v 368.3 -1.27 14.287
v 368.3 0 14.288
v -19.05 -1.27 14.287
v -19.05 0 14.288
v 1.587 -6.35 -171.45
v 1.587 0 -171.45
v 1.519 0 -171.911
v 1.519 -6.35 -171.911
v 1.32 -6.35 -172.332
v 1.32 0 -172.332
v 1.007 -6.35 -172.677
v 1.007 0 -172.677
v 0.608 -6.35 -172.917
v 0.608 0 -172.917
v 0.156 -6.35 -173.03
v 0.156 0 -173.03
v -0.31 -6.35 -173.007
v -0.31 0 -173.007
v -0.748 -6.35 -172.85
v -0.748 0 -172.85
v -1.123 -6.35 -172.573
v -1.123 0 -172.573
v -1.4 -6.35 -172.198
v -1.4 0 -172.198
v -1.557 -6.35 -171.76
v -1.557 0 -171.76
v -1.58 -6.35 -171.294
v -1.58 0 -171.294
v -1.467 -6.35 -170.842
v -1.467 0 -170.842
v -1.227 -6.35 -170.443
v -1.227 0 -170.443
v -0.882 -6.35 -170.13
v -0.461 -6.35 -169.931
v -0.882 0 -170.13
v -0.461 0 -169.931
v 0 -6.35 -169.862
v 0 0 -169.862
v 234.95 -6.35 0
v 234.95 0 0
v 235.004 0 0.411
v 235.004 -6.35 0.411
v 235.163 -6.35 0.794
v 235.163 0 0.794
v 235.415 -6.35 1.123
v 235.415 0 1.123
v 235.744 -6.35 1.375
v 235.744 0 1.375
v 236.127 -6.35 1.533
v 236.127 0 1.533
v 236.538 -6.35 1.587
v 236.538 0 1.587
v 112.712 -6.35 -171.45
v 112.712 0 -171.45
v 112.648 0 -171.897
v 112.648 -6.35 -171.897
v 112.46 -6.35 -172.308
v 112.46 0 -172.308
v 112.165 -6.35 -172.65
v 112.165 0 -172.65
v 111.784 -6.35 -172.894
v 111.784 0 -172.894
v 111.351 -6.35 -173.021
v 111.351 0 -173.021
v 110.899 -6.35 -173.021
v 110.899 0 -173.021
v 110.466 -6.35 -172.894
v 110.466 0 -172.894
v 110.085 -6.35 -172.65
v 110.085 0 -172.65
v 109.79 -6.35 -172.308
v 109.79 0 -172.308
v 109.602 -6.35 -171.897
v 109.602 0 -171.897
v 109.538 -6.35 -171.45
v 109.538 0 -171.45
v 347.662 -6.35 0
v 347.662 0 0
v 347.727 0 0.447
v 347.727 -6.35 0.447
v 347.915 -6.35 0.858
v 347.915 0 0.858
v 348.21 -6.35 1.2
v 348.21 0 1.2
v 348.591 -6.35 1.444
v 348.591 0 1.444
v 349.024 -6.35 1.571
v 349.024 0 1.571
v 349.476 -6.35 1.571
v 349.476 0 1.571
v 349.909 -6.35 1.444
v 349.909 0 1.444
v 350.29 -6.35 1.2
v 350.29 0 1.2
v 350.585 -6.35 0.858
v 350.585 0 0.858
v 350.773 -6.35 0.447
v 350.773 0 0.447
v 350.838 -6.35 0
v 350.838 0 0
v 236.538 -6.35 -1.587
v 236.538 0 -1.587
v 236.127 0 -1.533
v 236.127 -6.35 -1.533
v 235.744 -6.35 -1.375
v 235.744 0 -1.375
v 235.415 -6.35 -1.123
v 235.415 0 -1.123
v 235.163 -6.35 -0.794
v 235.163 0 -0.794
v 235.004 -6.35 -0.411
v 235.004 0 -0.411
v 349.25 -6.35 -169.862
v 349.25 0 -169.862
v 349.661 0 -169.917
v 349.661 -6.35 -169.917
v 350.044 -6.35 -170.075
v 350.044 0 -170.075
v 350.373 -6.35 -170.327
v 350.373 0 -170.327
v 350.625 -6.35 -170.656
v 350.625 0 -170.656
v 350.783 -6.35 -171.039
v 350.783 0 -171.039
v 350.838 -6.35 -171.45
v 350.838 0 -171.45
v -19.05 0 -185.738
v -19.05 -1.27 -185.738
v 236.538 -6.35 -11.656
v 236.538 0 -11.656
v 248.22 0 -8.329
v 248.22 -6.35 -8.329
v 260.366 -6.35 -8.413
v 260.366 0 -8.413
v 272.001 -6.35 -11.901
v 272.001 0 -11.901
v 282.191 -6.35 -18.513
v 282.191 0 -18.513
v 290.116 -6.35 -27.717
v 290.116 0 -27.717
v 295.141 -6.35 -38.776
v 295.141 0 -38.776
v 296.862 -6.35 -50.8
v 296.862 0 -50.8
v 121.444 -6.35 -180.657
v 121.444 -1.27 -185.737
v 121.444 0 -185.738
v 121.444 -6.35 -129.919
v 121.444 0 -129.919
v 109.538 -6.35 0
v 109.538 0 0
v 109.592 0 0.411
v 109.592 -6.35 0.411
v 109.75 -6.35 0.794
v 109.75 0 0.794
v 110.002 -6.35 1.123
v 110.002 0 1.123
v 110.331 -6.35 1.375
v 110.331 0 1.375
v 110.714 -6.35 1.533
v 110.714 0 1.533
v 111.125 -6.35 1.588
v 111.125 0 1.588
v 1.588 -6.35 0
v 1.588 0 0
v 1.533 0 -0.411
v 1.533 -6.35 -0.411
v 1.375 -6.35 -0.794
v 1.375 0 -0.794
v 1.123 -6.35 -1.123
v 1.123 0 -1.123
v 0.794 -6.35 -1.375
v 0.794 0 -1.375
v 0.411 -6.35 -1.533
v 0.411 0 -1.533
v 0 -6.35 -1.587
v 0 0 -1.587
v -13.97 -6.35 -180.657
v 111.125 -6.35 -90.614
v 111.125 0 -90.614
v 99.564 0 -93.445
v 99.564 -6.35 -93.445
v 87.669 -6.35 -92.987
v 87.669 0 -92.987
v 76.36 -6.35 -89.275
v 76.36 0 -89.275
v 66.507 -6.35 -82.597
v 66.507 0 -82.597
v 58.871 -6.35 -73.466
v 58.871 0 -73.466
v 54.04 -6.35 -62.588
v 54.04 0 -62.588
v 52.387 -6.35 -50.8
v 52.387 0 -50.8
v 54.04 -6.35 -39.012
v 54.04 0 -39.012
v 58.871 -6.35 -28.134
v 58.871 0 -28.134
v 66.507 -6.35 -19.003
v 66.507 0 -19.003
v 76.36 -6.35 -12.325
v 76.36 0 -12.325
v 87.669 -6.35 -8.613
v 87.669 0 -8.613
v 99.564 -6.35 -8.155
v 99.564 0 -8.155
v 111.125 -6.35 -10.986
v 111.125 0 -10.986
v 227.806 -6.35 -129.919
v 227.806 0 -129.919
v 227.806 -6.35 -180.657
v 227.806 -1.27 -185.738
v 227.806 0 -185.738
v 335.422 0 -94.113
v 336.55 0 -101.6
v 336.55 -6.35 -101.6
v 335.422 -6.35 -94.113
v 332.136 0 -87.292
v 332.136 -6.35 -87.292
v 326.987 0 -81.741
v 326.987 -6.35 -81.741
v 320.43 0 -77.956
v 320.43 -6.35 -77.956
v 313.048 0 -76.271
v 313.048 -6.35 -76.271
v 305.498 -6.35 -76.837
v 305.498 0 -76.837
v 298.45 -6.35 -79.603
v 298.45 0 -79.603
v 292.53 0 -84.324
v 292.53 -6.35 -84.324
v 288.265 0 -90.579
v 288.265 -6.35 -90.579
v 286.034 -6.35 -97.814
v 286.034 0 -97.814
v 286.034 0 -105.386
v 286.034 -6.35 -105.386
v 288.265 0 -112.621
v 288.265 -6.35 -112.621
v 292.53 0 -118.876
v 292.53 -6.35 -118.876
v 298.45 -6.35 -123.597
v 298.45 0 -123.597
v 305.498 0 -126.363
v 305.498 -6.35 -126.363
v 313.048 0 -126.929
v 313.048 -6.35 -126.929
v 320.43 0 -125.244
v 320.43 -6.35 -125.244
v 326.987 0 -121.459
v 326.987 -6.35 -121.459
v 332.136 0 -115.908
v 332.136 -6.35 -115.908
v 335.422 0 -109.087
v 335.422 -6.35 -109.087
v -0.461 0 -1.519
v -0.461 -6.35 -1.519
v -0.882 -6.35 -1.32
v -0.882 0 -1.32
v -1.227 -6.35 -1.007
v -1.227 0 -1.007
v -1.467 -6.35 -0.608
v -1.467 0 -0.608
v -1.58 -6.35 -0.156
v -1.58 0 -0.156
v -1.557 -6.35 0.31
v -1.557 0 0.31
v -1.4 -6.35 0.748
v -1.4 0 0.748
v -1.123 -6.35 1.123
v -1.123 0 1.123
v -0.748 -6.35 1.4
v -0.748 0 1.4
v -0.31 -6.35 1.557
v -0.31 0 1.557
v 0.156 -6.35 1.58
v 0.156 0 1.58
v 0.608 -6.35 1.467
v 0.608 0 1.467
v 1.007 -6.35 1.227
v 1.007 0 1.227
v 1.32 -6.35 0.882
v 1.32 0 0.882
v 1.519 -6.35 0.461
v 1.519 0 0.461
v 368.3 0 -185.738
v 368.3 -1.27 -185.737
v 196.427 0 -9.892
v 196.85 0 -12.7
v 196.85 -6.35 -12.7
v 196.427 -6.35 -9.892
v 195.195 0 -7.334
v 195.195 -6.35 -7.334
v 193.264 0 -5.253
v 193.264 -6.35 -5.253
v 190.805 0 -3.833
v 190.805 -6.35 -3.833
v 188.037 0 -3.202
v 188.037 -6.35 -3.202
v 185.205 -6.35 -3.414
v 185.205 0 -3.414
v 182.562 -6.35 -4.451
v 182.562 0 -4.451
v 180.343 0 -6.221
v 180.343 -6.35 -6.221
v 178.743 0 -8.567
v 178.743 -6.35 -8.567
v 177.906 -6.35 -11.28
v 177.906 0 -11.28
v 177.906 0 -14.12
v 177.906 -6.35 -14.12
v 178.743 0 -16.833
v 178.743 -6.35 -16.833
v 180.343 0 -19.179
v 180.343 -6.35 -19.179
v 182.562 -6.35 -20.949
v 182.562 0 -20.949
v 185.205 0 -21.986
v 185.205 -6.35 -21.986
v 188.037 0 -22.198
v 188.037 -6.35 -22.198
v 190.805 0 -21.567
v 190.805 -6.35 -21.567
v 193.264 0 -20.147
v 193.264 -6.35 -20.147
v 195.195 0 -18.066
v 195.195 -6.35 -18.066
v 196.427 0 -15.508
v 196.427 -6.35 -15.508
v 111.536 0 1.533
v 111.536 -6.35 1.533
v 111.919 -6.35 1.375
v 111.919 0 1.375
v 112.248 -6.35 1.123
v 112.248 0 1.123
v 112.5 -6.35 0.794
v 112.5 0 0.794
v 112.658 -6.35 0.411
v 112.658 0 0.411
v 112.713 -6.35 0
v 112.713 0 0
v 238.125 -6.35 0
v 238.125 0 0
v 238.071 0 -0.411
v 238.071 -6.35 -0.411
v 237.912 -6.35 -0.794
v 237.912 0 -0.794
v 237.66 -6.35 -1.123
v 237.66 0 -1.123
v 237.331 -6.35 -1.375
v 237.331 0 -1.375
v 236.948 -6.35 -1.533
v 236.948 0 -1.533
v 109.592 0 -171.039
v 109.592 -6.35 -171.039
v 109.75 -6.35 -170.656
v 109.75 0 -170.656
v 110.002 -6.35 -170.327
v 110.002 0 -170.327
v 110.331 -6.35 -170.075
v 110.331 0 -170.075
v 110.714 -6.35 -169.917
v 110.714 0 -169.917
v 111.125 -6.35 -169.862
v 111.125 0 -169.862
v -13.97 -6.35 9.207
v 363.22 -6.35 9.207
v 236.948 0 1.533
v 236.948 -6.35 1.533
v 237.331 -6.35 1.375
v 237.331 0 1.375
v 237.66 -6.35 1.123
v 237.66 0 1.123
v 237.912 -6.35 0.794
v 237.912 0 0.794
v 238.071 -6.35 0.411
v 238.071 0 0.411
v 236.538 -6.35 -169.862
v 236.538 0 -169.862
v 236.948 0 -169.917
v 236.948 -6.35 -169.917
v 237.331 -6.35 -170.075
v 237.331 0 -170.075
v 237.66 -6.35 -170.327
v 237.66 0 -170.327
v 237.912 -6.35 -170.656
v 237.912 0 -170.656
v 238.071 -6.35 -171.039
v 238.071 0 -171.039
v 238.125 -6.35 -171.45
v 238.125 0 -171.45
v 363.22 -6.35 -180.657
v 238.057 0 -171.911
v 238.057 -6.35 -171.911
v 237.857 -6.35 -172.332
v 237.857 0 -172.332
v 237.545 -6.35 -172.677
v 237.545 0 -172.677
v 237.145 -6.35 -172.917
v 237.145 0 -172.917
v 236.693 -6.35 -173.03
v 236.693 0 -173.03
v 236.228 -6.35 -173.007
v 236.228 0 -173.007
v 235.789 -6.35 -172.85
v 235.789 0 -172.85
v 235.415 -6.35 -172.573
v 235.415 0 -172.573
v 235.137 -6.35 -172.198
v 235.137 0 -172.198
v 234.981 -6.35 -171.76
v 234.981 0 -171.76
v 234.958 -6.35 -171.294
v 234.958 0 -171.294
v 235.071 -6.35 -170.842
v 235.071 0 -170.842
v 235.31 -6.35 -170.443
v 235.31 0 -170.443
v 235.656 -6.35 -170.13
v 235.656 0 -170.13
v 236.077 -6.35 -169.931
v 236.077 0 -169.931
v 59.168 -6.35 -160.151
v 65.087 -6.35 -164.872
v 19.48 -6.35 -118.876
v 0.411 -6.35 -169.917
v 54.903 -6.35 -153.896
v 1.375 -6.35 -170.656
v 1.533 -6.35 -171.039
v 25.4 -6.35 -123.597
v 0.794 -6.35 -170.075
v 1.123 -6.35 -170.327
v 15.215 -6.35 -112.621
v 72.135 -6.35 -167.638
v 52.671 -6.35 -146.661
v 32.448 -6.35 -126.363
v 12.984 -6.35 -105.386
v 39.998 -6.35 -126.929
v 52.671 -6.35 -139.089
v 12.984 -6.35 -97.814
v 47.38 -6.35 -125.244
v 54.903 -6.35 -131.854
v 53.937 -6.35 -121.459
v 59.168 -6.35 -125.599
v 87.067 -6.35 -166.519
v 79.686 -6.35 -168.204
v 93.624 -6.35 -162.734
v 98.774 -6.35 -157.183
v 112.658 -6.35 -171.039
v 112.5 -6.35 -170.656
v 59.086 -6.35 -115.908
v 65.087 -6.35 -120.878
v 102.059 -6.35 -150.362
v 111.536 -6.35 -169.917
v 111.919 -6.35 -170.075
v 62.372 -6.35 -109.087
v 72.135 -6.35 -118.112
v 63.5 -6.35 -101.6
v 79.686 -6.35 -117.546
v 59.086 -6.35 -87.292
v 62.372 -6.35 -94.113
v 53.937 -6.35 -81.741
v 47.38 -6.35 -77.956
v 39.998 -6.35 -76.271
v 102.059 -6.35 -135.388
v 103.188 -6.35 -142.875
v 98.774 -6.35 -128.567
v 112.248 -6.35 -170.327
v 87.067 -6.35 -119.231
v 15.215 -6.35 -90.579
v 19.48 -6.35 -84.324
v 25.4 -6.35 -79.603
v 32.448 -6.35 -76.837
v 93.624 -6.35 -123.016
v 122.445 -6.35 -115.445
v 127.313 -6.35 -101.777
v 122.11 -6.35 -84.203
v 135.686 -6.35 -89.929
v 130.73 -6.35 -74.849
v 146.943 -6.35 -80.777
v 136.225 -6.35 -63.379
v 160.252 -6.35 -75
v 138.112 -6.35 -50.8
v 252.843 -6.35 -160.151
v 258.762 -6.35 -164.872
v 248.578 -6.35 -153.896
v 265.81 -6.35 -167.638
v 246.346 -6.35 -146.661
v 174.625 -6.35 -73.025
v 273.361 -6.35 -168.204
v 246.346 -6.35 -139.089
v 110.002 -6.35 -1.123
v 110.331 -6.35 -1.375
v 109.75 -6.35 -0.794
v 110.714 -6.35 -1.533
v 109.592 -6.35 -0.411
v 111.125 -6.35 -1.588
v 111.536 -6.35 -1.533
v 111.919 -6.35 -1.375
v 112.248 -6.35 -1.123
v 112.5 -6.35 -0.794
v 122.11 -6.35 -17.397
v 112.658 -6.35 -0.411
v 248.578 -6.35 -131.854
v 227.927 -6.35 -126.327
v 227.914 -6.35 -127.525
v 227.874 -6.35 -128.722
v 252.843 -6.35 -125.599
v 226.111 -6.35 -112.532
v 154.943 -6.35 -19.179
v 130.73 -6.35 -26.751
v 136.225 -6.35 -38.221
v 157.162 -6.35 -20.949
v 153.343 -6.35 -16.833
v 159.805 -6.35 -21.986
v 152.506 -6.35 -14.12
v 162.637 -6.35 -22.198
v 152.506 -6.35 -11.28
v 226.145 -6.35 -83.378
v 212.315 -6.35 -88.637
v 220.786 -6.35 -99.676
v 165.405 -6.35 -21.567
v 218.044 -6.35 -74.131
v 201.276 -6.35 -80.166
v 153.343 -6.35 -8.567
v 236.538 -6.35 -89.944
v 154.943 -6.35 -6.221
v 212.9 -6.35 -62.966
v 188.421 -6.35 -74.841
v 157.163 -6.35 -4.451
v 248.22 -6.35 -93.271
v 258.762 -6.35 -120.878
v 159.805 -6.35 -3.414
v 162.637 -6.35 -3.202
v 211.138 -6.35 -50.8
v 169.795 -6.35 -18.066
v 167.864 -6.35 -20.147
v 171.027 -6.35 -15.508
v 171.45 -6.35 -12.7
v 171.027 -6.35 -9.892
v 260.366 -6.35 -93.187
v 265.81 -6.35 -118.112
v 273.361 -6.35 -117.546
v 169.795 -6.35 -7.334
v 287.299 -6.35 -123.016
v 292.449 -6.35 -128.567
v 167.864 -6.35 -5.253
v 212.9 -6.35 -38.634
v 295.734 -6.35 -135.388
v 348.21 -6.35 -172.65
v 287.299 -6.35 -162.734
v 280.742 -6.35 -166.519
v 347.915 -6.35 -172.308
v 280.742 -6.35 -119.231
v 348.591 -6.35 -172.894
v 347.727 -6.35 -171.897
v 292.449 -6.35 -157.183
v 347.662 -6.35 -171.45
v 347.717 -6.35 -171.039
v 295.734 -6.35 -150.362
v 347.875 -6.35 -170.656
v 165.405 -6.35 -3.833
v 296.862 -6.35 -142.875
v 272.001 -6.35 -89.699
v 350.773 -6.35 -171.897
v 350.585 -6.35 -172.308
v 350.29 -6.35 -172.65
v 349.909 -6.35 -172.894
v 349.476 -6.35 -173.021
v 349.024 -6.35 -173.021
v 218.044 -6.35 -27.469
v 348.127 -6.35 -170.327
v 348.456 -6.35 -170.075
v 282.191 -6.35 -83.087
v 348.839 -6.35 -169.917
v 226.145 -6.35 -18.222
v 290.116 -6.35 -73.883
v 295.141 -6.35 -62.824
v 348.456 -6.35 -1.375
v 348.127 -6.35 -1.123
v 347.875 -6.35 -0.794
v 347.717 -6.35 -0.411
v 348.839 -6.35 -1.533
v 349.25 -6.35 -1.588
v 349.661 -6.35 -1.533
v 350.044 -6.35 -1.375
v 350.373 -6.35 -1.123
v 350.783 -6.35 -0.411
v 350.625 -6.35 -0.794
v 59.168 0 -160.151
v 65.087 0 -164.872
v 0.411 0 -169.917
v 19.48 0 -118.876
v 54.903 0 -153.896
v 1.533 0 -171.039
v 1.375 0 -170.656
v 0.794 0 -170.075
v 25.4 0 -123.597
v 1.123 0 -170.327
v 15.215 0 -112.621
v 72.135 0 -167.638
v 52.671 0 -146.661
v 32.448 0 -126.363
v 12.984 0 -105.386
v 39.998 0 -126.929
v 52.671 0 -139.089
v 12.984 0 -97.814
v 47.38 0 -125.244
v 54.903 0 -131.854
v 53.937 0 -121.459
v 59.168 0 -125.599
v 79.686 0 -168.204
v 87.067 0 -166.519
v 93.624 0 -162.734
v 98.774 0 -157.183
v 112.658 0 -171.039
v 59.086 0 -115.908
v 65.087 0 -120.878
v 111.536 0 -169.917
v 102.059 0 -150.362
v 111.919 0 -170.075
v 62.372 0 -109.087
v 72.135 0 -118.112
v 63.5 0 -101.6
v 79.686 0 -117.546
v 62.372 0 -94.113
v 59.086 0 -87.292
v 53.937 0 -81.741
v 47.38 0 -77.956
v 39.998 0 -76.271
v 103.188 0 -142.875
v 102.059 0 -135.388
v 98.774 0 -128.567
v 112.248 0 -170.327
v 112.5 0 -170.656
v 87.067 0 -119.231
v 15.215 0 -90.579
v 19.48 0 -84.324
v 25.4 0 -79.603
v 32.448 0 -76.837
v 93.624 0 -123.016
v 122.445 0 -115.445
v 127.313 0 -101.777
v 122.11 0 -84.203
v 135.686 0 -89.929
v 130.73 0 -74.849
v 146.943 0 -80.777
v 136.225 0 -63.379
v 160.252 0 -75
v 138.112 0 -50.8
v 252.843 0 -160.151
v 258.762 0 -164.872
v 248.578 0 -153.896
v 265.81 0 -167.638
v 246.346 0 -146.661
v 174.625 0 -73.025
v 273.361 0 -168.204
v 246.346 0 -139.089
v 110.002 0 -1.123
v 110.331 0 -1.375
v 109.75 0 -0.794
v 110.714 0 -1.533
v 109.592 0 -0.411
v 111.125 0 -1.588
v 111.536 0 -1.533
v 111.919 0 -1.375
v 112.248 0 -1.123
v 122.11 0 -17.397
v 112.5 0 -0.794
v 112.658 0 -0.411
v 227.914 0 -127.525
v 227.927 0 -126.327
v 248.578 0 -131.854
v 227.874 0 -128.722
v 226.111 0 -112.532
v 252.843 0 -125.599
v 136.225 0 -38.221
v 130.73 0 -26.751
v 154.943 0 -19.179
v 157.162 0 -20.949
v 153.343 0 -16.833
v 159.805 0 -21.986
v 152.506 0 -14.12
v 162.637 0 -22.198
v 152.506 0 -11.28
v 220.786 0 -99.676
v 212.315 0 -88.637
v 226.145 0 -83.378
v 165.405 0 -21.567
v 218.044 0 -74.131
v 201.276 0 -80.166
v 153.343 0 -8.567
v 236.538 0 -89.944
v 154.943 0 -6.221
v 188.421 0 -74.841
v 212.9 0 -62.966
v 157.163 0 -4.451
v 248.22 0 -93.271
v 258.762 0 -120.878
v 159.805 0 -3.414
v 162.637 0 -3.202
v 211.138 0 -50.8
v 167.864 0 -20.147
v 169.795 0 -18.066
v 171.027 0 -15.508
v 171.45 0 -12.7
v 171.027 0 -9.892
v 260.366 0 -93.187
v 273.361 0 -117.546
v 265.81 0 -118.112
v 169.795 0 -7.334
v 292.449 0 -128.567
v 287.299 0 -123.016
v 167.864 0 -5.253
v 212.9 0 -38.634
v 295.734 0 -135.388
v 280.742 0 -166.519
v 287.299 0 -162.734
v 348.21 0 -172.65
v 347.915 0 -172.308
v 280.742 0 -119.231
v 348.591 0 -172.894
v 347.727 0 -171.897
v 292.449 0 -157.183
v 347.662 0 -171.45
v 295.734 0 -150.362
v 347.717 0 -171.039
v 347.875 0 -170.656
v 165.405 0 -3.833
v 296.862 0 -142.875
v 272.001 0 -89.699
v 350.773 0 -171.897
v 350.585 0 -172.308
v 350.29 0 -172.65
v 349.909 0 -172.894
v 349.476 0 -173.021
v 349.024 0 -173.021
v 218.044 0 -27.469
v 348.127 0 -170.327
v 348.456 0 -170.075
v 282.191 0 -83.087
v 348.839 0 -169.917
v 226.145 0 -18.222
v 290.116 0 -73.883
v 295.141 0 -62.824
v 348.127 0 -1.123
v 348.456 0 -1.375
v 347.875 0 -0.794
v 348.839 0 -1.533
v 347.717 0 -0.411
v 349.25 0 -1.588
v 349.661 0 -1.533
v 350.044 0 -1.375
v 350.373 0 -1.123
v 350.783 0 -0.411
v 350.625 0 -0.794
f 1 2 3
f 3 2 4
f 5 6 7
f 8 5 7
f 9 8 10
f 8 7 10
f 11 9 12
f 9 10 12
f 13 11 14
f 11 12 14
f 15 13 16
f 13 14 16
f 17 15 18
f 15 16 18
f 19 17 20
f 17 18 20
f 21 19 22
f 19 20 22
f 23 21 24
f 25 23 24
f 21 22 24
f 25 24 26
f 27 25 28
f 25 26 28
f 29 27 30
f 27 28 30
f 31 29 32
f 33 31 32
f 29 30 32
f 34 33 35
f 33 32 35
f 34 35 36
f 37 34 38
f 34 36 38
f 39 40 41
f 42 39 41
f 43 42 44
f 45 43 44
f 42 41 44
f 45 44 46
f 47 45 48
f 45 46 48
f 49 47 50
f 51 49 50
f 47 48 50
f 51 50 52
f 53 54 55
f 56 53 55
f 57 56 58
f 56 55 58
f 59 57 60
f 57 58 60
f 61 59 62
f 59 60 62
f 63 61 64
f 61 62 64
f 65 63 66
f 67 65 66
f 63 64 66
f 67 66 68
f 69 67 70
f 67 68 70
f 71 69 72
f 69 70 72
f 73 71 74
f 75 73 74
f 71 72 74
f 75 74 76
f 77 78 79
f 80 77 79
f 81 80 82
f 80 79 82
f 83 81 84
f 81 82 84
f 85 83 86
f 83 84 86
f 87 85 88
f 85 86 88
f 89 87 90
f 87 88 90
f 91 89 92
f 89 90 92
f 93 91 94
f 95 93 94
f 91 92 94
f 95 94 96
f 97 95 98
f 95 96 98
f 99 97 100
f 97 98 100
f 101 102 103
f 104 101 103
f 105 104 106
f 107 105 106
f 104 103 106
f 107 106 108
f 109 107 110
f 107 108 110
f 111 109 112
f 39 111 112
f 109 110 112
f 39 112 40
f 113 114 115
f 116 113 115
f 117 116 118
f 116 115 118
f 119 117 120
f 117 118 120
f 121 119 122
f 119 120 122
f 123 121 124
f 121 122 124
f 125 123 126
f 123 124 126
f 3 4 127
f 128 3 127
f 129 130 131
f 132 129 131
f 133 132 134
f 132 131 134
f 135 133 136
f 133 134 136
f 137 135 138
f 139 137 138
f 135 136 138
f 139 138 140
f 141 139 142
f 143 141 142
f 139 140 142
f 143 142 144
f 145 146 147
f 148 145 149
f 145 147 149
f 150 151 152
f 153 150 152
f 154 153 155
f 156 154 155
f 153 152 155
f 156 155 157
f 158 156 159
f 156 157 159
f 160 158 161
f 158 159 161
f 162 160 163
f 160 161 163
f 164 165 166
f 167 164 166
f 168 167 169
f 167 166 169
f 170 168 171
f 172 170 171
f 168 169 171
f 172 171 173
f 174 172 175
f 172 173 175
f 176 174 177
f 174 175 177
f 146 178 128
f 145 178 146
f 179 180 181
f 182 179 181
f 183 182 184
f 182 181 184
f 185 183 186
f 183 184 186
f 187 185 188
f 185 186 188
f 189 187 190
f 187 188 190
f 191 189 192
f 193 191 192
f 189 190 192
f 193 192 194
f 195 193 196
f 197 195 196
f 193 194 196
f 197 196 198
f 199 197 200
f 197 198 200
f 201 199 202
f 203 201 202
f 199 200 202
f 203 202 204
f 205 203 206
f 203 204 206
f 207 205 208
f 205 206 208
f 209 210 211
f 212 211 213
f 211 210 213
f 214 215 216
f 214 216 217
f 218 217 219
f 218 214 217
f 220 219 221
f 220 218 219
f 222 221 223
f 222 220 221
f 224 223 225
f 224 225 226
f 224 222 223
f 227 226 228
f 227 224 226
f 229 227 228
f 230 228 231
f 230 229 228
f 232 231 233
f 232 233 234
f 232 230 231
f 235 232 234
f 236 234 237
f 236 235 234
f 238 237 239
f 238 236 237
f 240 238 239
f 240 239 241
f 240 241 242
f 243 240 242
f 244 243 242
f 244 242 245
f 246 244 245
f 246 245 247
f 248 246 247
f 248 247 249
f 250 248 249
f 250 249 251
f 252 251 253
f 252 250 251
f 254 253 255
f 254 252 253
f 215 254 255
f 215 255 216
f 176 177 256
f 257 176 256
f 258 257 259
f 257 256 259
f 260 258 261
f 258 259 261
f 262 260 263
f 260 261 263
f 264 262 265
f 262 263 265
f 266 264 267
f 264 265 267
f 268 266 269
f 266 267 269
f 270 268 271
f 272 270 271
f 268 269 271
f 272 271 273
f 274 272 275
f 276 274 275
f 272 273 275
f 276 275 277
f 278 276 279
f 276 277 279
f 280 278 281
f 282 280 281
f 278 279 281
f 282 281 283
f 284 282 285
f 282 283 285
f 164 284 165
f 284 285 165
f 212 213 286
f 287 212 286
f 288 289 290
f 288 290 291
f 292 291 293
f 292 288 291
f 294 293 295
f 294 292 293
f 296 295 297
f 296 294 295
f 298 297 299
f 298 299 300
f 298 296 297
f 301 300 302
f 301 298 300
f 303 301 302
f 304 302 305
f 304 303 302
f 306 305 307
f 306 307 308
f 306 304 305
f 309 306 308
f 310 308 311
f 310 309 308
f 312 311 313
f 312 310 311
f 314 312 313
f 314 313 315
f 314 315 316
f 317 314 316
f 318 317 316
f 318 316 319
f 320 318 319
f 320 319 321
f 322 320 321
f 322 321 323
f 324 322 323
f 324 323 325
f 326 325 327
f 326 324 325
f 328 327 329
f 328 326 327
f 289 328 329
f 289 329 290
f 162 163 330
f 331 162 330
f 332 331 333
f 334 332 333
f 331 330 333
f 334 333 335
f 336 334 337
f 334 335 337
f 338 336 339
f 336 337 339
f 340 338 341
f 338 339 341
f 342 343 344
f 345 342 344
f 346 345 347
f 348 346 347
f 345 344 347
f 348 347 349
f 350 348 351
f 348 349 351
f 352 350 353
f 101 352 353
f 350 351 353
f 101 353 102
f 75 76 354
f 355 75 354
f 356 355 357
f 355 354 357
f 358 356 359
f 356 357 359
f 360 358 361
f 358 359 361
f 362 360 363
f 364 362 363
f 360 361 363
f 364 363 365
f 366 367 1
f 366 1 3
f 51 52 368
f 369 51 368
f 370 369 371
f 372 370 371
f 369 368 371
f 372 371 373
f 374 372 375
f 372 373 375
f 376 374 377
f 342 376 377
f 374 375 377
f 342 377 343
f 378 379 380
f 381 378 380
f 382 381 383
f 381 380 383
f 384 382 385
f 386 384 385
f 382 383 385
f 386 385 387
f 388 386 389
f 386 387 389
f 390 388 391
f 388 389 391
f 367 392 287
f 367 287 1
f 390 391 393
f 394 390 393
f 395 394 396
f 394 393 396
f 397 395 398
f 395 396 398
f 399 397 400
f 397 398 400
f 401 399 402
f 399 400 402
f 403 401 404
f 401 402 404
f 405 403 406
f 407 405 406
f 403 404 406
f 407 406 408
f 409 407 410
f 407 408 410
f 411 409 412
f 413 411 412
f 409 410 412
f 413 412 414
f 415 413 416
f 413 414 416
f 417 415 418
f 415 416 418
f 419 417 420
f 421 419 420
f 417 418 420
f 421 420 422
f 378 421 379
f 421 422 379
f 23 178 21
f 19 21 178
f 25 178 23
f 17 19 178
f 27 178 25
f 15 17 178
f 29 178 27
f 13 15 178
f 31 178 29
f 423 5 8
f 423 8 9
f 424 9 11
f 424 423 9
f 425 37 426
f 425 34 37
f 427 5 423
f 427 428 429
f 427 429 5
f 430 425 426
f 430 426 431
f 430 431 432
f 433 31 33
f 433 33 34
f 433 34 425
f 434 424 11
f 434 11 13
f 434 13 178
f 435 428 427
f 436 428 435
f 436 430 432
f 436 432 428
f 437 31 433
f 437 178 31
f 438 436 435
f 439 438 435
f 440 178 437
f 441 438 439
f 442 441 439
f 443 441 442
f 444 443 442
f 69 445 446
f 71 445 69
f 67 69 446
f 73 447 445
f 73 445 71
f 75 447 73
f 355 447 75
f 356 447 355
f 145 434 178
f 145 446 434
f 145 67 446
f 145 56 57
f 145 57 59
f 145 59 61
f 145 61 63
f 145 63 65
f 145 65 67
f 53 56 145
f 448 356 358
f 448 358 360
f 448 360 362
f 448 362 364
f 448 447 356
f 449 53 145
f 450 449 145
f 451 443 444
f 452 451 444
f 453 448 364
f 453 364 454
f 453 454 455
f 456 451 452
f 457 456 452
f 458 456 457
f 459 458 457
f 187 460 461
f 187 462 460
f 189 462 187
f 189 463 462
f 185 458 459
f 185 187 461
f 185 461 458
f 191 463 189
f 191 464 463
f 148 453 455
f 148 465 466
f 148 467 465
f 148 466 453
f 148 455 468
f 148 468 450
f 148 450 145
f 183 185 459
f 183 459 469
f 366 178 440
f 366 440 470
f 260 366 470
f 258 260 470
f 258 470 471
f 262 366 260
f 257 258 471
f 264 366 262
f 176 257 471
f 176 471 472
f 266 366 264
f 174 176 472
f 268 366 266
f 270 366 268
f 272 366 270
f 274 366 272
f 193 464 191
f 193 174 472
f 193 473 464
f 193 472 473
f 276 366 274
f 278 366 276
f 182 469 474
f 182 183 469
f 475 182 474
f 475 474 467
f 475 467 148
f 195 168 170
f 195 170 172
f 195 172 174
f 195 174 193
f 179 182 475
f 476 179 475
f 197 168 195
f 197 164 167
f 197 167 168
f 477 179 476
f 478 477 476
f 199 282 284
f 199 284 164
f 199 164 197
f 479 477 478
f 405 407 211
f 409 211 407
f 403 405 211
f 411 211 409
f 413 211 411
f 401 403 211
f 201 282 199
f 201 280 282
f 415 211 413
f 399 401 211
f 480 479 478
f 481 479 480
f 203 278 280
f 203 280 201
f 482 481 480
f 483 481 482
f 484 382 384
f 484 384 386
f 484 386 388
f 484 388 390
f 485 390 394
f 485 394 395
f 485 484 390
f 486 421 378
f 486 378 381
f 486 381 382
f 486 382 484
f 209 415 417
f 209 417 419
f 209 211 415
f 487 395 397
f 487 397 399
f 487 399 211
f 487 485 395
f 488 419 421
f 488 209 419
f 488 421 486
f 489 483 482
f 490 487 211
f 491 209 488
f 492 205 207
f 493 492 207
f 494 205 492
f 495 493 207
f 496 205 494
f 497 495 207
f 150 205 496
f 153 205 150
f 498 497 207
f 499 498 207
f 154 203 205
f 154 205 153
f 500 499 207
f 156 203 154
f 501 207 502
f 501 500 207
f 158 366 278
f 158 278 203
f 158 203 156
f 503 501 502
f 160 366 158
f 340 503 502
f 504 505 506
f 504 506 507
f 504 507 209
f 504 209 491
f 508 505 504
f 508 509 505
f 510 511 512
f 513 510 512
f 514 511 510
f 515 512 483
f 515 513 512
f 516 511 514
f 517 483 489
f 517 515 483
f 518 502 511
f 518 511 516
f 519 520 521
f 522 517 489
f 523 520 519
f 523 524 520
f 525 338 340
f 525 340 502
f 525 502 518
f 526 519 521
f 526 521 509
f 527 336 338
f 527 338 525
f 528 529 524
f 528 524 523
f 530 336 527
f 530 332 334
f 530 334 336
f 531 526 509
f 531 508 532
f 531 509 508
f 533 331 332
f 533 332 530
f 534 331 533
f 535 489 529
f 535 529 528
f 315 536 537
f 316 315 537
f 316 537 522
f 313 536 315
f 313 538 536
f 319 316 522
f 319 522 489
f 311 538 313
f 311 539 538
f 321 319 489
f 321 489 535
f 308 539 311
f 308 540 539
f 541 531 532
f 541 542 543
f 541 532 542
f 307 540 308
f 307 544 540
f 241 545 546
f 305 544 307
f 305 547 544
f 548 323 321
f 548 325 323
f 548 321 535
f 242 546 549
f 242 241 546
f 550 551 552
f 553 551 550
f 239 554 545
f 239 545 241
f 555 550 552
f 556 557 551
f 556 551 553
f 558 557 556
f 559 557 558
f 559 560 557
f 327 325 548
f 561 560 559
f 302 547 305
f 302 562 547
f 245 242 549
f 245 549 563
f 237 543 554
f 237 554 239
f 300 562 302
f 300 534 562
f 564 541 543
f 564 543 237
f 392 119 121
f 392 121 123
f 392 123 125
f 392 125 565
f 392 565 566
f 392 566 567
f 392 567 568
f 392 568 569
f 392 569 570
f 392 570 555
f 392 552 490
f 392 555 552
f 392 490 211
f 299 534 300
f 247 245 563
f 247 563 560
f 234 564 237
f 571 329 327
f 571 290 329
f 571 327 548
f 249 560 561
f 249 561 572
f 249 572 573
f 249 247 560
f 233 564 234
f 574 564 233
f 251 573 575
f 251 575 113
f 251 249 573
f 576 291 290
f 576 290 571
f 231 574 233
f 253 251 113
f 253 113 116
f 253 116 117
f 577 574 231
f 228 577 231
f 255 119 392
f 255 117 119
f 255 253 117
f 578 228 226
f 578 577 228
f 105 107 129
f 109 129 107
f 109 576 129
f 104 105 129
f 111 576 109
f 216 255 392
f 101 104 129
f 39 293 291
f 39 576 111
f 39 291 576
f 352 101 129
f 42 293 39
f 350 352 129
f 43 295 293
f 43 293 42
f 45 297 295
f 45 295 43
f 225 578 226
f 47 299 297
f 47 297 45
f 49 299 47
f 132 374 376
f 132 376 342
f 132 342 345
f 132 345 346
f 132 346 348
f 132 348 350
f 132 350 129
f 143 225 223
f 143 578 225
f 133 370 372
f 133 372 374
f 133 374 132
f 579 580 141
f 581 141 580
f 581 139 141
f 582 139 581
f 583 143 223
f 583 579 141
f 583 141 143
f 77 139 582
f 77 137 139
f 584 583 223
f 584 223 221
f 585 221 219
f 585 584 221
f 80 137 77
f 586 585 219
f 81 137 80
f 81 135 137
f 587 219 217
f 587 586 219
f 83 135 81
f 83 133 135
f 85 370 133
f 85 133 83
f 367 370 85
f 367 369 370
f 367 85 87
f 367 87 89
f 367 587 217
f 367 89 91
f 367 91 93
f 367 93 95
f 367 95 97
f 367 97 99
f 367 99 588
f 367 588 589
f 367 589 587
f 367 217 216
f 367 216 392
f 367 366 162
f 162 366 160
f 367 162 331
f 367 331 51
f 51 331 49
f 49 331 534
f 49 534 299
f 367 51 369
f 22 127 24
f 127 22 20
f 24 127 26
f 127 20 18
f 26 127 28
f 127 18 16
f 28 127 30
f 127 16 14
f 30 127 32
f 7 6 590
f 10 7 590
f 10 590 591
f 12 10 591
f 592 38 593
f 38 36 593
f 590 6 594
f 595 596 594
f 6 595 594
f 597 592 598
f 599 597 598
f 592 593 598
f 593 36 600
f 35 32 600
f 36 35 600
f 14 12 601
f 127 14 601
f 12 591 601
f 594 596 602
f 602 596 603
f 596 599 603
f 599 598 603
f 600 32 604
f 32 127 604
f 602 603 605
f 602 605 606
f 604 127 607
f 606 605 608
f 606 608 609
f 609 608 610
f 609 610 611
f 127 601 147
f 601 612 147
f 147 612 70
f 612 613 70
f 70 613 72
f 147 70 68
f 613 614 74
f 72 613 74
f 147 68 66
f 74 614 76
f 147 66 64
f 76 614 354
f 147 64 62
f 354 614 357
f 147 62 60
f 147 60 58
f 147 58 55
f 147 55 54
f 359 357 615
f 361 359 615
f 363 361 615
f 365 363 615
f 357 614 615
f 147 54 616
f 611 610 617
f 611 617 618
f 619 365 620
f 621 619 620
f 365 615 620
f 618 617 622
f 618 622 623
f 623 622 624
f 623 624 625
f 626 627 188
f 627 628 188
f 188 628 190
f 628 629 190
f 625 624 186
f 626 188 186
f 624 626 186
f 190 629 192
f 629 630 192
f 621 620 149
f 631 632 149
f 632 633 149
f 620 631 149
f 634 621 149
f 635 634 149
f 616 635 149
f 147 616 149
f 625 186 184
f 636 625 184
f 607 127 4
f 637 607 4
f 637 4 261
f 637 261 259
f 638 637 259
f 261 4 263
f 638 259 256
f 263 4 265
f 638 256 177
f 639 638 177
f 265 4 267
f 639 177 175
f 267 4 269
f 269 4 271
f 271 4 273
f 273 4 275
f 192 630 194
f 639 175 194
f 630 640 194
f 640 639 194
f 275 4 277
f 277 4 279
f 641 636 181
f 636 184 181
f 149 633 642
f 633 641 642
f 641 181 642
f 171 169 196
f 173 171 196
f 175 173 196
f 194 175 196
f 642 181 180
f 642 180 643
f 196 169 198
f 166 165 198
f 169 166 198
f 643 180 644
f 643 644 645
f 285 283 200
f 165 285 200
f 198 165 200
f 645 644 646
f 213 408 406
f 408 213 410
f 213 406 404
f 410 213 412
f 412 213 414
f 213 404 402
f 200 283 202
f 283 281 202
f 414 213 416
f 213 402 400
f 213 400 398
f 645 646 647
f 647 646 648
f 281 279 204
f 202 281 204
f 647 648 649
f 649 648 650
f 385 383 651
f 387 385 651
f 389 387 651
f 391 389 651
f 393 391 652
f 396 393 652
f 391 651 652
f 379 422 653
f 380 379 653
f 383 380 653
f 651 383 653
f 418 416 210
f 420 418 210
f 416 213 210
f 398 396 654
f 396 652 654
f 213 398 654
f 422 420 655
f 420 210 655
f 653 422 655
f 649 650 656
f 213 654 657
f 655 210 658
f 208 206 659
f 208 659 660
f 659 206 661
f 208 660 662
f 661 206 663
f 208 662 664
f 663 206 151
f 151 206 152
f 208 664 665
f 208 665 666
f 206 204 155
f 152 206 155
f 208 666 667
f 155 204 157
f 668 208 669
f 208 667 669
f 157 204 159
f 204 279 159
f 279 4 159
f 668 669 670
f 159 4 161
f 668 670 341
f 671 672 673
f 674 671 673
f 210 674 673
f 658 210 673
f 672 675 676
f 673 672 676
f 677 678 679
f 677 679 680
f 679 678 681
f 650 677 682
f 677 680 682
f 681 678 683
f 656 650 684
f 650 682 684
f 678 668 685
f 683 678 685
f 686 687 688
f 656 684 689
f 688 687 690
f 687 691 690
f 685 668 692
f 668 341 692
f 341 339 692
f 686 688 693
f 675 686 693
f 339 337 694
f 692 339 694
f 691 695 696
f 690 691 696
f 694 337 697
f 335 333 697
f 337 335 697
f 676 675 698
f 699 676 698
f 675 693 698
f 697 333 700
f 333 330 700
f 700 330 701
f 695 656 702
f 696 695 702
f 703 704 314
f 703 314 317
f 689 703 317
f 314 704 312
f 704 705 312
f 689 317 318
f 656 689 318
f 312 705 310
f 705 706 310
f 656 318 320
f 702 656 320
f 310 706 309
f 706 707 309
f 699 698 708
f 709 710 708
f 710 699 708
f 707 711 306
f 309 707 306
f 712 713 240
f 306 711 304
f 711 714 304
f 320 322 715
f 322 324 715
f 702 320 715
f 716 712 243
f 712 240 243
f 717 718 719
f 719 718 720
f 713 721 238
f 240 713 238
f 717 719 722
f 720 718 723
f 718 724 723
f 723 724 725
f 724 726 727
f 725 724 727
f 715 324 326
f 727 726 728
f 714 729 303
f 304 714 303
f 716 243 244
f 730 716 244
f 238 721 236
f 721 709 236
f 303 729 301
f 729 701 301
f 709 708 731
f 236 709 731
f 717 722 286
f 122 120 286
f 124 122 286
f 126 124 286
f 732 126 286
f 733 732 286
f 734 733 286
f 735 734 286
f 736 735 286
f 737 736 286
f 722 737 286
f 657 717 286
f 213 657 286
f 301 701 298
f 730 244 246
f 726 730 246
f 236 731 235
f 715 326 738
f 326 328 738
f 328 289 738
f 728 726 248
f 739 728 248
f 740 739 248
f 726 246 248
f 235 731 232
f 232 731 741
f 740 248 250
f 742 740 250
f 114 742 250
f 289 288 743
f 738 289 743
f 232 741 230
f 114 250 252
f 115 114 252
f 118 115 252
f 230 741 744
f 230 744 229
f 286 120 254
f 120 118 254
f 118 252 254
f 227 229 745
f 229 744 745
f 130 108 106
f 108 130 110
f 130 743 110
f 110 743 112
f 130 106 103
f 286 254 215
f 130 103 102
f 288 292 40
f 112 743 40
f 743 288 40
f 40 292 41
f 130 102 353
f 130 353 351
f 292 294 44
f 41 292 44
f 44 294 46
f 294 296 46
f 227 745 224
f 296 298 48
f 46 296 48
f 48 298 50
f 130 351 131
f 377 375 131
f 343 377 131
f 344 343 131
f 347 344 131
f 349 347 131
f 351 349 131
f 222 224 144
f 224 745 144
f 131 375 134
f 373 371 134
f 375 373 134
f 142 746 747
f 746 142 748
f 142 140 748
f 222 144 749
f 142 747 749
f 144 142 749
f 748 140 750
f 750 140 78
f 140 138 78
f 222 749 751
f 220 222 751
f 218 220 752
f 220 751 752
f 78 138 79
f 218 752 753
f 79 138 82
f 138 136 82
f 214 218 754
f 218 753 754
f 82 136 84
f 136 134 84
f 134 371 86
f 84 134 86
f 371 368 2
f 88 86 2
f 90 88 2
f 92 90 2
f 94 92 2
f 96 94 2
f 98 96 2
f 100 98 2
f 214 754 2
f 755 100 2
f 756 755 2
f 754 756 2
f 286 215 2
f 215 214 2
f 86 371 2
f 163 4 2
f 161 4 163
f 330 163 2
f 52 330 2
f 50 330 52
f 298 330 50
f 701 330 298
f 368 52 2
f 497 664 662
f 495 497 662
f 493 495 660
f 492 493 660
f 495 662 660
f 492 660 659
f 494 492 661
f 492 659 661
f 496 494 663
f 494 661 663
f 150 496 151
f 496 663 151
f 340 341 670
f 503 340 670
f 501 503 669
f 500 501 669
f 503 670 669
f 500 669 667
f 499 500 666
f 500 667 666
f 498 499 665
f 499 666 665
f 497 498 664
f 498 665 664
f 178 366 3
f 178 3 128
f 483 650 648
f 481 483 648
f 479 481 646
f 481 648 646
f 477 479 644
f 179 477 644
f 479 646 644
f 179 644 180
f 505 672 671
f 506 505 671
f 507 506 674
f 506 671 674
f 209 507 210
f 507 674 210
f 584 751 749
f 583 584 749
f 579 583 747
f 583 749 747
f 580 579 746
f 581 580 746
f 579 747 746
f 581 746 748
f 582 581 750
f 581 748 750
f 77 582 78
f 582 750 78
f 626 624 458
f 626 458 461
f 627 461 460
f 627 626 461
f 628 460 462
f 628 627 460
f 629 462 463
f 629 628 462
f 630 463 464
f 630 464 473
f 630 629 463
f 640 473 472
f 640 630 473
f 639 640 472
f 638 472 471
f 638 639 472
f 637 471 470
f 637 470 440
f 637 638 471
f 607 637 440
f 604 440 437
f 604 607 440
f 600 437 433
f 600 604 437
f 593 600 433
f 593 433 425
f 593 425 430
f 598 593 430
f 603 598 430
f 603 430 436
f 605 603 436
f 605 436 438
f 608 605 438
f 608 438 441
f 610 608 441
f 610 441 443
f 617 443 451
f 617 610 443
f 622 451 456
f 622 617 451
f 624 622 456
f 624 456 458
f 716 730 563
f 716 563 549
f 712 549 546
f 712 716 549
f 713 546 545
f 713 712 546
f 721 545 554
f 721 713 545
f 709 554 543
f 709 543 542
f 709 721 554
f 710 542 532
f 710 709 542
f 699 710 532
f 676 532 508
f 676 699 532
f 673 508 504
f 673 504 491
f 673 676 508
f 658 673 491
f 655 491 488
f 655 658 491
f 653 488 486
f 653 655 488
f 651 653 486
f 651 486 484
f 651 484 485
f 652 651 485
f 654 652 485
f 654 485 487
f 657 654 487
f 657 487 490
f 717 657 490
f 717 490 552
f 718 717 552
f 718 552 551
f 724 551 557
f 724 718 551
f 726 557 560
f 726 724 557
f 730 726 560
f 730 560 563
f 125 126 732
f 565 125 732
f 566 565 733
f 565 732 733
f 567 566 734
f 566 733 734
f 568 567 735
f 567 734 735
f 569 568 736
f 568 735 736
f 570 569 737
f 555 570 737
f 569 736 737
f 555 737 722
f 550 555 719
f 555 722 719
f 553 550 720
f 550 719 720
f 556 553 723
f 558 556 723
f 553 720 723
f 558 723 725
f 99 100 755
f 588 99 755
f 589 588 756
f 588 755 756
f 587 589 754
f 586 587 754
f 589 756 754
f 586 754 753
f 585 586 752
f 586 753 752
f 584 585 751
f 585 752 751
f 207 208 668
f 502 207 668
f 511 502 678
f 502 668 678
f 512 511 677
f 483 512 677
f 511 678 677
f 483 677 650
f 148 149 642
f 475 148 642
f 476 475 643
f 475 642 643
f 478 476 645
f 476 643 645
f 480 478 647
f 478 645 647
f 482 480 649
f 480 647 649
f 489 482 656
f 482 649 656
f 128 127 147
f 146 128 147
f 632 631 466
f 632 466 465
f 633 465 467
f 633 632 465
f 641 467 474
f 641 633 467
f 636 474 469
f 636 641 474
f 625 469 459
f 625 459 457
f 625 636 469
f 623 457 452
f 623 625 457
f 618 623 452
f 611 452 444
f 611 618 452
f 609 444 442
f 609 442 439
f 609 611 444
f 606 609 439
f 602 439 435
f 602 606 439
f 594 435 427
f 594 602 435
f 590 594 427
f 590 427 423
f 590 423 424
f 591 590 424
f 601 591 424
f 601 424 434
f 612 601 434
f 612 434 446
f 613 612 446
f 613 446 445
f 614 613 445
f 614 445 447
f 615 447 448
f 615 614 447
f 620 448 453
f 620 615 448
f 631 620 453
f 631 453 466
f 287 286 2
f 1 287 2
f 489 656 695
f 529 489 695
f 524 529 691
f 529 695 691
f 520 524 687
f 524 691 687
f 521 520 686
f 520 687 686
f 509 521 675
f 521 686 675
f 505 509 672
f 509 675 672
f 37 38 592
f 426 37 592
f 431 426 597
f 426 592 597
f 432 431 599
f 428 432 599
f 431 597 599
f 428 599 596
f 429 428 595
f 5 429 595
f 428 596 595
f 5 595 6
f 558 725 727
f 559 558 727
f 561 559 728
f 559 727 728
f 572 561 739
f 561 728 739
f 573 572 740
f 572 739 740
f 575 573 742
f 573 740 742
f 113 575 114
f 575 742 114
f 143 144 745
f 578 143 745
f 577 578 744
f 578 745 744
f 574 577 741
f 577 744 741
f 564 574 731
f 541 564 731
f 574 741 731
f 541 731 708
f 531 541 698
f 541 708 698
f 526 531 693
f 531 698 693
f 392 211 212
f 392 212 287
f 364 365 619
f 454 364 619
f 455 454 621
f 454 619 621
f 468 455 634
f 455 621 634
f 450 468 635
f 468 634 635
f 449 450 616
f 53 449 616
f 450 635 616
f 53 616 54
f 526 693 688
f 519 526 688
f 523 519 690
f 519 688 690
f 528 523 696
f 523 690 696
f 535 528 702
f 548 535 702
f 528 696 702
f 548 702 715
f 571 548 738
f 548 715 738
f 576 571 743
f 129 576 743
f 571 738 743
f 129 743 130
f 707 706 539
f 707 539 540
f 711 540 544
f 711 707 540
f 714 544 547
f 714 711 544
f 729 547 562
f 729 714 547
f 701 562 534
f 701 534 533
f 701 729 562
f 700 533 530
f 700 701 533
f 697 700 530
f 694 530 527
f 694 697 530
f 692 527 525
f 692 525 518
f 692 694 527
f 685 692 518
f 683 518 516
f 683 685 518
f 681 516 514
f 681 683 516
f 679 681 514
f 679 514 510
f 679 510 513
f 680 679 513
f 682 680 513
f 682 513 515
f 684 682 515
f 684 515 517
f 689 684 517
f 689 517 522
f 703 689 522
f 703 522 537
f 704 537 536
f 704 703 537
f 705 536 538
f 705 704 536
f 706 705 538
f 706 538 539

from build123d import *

# Parameters (mm, degrees)
F0_R     = 25.4
F0_R_2   = 9.525
F1_DEPTH = 6.35
F2_SIZE  = 5.08


with BuildPart() as f1:
    # F0 (on Front) → F1 (new body)
    with BuildSketch(Plane.XZ):
        with BuildLine():
            Line((109.5375, 0), (1.5875, 0))
            ThreePointArc((1.5875, 0), (1.122532, -1.122532), (0, -1.5875))
            Line((0, -1.5875), (0, -169.8625))
            ThreePointArc((0, -169.8625), (1.122532, -170.327468), (1.5875, -171.45))
            Line((1.5875, -171.45), (109.5375, -171.45))
            ThreePointArc((109.5375, -171.45), (110.002468, -170.327468), (111.125, -169.8625))
            Line((111.125, -169.8625), (111.125, -90.614297))
            ThreePointArc((111.125, -90.614297), (52.3875, -50.8), (111.125, -10.985703))
            Line((111.125, -10.985703), (111.125, -1.5875))
            ThreePointArc((111.125, -1.5875), (110.002468, -1.122532), (109.5375, 0))
        make_face()
        with Locations((77.7875, -142.875)):
            Circle(F0_R, mode=Mode.SUBTRACT)
        with Locations((38.1, -101.6)):
            Circle(F0_R, mode=Mode.SUBTRACT)
        with BuildLine():
            ThreePointArc((0, -1.5875), (-1.122532, 1.122532), (1.5875, 0))
            Line((1.5875, 0), (109.5375, 0))
            ThreePointArc((109.5375, 0), (110.002468, 1.122532), (111.125, 1.5875))
            Line((111.125, 1.5875), (111.125, 14.2875))
            Line((111.125, 14.2875), (-19.05, 14.2875))
            Line((-19.05, 14.2875), (-19.05, -185.7375))
            Line((-19.05, -185.7375), (121.44375, -185.7375))
            Line((121.44375, -185.7375), (121.44375, -129.918501))
            ThreePointArc((121.44375, -129.918501), (135.685573, -89.928697), (174.625, -73.025))
            Line((174.625, -73.025), (174.625, 0))
            Line((174.625, 0), (112.7125, 0))
            ThreePointArc((112.7125, 0), (112.247532, -1.122532), (111.125, -1.5875))
            Line((111.125, -1.5875), (111.125, -10.985703))
            ThreePointArc((111.125, -10.985703), (130.729826, -26.750554), (138.1125, -50.8))
            ThreePointArc((138.1125, -50.8), (130.729826, -74.849446), (111.125, -90.614297))
            Line((111.125, -90.614297), (111.125, -169.8625))
            ThreePointArc((111.125, -169.8625), (112.247532, -170.327468), (112.7125, -171.45))
            ThreePointArc((112.7125, -171.45), (111.125, -173.0375), (109.5375, -171.45))
            Line((109.5375, -171.45), (1.5875, -171.45))
            ThreePointArc((1.5875, -171.45), (-1.122532, -172.572532), (0, -169.8625))
            Line((0, -169.8625), (0, -1.5875))
        make_face()
        with Locations((161.925, -12.7)):
            Circle(F0_R_2, mode=Mode.SUBTRACT)
        with BuildLine():
            Line((234.95, 0), (174.625, 0))
            Line((174.625, 0), (174.625, -73.025))
            ThreePointArc((174.625, -73.025), (212.315461, -88.6369), (227.927361, -126.327361))
            ThreePointArc((227.927361, -126.327361), (227.897074, -128.123951), (227.80625, -129.918501))
            Line((227.80625, -129.918501), (227.80625, -185.7375))
            Line((227.80625, -185.7375), (368.3, -185.7375))
            Line((368.3, -185.7375), (368.3, 14.2875))
            Line((368.3, 14.2875), (236.5375, 14.2875))
            Line((236.5375, 14.2875), (236.5375, 1.5875))
            ThreePointArc((236.5375, 1.5875), (237.660032, 1.122532), (238.125, 0))
            Line((238.125, 0), (347.6625, 0))
            ThreePointArc((347.6625, 0), (349.25, 1.5875), (350.8375, 0))
            ThreePointArc((350.8375, 0), (350.372532, -1.122532), (349.25, -1.5875))
            Line((349.25, -1.5875), (349.25, -169.8625))
            ThreePointArc((349.25, -169.8625), (350.372532, -170.327468), (350.8375, -171.45))
            ThreePointArc((350.8375, -171.45), (349.25, -173.0375), (347.6625, -171.45))
            Line((347.6625, -171.45), (238.125, -171.45))
            ThreePointArc((238.125, -171.45), (235.414968, -172.572532), (236.5375, -169.8625))
            Line((236.5375, -169.8625), (236.5375, -89.944029))
            ThreePointArc((236.5375, -89.944029), (211.1375, -50.8), (236.5375, -11.655971))
            Line((236.5375, -11.655971), (236.5375, -1.5875))
            ThreePointArc((236.5375, -1.5875), (235.414968, -1.122532), (234.95, 0))
        make_face()
        with Locations((187.325, -12.7)):
            Circle(F0_R_2, mode=Mode.SUBTRACT)
        with BuildLine():
            Line((111.125, 14.2875), (111.125, 1.5875))
            ThreePointArc((111.125, 1.5875), (112.247532, 1.122532), (112.7125, 0))
            Line((112.7125, 0), (174.625, 0))
            Line((174.625, 0), (234.95, 0))
            ThreePointArc((234.95, 0), (235.414968, 1.122532), (236.5375, 1.5875))
            Line((236.5375, 1.5875), (236.5375, 14.2875))
            Line((236.5375, 14.2875), (111.125, 14.2875))
        make_face()
        with BuildLine():
            ThreePointArc((238.125, 0), (237.660032, -1.122532), (236.5375, -1.5875))
            Line((236.5375, -1.5875), (236.5375, -11.655971))
            ThreePointArc((236.5375, -11.655971), (277.33139, -14.843914), (296.8625, -50.8))
            ThreePointArc((296.8625, -50.8), (277.33139, -86.756086), (236.5375, -89.944029))
            Line((236.5375, -89.944029), (236.5375, -169.8625))
            ThreePointArc((236.5375, -169.8625), (237.660032, -170.327468), (238.125, -171.45))
            Line((238.125, -171.45), (347.6625, -171.45))
            ThreePointArc((347.6625, -171.45), (348.127468, -170.327468), (349.25, -169.8625))
            Line((349.25, -169.8625), (349.25, -1.5875))
            ThreePointArc((349.25, -1.5875), (348.127468, -1.122532), (347.6625, 0))
            Line((347.6625, 0), (238.125, 0))
        make_face()
        with Locations((271.4625, -142.875)):
            Circle(F0_R, mode=Mode.SUBTRACT)
        with Locations((311.15, -101.6)):
            Circle(F0_R, mode=Mode.SUBTRACT)
    extrude(amount=F1_DEPTH)

    # F2
    f2_edges = [f1.edges().sort_by_distance(p)[0] for p in [
        (174.625, -6.35, 14.2875),
        (298.053125, -6.35, -185.7375),
        (368.3, -6.35, -85.725),
        (51.196875, -6.35, -185.7375),
        (-19.05, -6.35, -85.725),
    ]]
    chamfer(f2_edges, length=F2_SIZE)


solid = f1.part
